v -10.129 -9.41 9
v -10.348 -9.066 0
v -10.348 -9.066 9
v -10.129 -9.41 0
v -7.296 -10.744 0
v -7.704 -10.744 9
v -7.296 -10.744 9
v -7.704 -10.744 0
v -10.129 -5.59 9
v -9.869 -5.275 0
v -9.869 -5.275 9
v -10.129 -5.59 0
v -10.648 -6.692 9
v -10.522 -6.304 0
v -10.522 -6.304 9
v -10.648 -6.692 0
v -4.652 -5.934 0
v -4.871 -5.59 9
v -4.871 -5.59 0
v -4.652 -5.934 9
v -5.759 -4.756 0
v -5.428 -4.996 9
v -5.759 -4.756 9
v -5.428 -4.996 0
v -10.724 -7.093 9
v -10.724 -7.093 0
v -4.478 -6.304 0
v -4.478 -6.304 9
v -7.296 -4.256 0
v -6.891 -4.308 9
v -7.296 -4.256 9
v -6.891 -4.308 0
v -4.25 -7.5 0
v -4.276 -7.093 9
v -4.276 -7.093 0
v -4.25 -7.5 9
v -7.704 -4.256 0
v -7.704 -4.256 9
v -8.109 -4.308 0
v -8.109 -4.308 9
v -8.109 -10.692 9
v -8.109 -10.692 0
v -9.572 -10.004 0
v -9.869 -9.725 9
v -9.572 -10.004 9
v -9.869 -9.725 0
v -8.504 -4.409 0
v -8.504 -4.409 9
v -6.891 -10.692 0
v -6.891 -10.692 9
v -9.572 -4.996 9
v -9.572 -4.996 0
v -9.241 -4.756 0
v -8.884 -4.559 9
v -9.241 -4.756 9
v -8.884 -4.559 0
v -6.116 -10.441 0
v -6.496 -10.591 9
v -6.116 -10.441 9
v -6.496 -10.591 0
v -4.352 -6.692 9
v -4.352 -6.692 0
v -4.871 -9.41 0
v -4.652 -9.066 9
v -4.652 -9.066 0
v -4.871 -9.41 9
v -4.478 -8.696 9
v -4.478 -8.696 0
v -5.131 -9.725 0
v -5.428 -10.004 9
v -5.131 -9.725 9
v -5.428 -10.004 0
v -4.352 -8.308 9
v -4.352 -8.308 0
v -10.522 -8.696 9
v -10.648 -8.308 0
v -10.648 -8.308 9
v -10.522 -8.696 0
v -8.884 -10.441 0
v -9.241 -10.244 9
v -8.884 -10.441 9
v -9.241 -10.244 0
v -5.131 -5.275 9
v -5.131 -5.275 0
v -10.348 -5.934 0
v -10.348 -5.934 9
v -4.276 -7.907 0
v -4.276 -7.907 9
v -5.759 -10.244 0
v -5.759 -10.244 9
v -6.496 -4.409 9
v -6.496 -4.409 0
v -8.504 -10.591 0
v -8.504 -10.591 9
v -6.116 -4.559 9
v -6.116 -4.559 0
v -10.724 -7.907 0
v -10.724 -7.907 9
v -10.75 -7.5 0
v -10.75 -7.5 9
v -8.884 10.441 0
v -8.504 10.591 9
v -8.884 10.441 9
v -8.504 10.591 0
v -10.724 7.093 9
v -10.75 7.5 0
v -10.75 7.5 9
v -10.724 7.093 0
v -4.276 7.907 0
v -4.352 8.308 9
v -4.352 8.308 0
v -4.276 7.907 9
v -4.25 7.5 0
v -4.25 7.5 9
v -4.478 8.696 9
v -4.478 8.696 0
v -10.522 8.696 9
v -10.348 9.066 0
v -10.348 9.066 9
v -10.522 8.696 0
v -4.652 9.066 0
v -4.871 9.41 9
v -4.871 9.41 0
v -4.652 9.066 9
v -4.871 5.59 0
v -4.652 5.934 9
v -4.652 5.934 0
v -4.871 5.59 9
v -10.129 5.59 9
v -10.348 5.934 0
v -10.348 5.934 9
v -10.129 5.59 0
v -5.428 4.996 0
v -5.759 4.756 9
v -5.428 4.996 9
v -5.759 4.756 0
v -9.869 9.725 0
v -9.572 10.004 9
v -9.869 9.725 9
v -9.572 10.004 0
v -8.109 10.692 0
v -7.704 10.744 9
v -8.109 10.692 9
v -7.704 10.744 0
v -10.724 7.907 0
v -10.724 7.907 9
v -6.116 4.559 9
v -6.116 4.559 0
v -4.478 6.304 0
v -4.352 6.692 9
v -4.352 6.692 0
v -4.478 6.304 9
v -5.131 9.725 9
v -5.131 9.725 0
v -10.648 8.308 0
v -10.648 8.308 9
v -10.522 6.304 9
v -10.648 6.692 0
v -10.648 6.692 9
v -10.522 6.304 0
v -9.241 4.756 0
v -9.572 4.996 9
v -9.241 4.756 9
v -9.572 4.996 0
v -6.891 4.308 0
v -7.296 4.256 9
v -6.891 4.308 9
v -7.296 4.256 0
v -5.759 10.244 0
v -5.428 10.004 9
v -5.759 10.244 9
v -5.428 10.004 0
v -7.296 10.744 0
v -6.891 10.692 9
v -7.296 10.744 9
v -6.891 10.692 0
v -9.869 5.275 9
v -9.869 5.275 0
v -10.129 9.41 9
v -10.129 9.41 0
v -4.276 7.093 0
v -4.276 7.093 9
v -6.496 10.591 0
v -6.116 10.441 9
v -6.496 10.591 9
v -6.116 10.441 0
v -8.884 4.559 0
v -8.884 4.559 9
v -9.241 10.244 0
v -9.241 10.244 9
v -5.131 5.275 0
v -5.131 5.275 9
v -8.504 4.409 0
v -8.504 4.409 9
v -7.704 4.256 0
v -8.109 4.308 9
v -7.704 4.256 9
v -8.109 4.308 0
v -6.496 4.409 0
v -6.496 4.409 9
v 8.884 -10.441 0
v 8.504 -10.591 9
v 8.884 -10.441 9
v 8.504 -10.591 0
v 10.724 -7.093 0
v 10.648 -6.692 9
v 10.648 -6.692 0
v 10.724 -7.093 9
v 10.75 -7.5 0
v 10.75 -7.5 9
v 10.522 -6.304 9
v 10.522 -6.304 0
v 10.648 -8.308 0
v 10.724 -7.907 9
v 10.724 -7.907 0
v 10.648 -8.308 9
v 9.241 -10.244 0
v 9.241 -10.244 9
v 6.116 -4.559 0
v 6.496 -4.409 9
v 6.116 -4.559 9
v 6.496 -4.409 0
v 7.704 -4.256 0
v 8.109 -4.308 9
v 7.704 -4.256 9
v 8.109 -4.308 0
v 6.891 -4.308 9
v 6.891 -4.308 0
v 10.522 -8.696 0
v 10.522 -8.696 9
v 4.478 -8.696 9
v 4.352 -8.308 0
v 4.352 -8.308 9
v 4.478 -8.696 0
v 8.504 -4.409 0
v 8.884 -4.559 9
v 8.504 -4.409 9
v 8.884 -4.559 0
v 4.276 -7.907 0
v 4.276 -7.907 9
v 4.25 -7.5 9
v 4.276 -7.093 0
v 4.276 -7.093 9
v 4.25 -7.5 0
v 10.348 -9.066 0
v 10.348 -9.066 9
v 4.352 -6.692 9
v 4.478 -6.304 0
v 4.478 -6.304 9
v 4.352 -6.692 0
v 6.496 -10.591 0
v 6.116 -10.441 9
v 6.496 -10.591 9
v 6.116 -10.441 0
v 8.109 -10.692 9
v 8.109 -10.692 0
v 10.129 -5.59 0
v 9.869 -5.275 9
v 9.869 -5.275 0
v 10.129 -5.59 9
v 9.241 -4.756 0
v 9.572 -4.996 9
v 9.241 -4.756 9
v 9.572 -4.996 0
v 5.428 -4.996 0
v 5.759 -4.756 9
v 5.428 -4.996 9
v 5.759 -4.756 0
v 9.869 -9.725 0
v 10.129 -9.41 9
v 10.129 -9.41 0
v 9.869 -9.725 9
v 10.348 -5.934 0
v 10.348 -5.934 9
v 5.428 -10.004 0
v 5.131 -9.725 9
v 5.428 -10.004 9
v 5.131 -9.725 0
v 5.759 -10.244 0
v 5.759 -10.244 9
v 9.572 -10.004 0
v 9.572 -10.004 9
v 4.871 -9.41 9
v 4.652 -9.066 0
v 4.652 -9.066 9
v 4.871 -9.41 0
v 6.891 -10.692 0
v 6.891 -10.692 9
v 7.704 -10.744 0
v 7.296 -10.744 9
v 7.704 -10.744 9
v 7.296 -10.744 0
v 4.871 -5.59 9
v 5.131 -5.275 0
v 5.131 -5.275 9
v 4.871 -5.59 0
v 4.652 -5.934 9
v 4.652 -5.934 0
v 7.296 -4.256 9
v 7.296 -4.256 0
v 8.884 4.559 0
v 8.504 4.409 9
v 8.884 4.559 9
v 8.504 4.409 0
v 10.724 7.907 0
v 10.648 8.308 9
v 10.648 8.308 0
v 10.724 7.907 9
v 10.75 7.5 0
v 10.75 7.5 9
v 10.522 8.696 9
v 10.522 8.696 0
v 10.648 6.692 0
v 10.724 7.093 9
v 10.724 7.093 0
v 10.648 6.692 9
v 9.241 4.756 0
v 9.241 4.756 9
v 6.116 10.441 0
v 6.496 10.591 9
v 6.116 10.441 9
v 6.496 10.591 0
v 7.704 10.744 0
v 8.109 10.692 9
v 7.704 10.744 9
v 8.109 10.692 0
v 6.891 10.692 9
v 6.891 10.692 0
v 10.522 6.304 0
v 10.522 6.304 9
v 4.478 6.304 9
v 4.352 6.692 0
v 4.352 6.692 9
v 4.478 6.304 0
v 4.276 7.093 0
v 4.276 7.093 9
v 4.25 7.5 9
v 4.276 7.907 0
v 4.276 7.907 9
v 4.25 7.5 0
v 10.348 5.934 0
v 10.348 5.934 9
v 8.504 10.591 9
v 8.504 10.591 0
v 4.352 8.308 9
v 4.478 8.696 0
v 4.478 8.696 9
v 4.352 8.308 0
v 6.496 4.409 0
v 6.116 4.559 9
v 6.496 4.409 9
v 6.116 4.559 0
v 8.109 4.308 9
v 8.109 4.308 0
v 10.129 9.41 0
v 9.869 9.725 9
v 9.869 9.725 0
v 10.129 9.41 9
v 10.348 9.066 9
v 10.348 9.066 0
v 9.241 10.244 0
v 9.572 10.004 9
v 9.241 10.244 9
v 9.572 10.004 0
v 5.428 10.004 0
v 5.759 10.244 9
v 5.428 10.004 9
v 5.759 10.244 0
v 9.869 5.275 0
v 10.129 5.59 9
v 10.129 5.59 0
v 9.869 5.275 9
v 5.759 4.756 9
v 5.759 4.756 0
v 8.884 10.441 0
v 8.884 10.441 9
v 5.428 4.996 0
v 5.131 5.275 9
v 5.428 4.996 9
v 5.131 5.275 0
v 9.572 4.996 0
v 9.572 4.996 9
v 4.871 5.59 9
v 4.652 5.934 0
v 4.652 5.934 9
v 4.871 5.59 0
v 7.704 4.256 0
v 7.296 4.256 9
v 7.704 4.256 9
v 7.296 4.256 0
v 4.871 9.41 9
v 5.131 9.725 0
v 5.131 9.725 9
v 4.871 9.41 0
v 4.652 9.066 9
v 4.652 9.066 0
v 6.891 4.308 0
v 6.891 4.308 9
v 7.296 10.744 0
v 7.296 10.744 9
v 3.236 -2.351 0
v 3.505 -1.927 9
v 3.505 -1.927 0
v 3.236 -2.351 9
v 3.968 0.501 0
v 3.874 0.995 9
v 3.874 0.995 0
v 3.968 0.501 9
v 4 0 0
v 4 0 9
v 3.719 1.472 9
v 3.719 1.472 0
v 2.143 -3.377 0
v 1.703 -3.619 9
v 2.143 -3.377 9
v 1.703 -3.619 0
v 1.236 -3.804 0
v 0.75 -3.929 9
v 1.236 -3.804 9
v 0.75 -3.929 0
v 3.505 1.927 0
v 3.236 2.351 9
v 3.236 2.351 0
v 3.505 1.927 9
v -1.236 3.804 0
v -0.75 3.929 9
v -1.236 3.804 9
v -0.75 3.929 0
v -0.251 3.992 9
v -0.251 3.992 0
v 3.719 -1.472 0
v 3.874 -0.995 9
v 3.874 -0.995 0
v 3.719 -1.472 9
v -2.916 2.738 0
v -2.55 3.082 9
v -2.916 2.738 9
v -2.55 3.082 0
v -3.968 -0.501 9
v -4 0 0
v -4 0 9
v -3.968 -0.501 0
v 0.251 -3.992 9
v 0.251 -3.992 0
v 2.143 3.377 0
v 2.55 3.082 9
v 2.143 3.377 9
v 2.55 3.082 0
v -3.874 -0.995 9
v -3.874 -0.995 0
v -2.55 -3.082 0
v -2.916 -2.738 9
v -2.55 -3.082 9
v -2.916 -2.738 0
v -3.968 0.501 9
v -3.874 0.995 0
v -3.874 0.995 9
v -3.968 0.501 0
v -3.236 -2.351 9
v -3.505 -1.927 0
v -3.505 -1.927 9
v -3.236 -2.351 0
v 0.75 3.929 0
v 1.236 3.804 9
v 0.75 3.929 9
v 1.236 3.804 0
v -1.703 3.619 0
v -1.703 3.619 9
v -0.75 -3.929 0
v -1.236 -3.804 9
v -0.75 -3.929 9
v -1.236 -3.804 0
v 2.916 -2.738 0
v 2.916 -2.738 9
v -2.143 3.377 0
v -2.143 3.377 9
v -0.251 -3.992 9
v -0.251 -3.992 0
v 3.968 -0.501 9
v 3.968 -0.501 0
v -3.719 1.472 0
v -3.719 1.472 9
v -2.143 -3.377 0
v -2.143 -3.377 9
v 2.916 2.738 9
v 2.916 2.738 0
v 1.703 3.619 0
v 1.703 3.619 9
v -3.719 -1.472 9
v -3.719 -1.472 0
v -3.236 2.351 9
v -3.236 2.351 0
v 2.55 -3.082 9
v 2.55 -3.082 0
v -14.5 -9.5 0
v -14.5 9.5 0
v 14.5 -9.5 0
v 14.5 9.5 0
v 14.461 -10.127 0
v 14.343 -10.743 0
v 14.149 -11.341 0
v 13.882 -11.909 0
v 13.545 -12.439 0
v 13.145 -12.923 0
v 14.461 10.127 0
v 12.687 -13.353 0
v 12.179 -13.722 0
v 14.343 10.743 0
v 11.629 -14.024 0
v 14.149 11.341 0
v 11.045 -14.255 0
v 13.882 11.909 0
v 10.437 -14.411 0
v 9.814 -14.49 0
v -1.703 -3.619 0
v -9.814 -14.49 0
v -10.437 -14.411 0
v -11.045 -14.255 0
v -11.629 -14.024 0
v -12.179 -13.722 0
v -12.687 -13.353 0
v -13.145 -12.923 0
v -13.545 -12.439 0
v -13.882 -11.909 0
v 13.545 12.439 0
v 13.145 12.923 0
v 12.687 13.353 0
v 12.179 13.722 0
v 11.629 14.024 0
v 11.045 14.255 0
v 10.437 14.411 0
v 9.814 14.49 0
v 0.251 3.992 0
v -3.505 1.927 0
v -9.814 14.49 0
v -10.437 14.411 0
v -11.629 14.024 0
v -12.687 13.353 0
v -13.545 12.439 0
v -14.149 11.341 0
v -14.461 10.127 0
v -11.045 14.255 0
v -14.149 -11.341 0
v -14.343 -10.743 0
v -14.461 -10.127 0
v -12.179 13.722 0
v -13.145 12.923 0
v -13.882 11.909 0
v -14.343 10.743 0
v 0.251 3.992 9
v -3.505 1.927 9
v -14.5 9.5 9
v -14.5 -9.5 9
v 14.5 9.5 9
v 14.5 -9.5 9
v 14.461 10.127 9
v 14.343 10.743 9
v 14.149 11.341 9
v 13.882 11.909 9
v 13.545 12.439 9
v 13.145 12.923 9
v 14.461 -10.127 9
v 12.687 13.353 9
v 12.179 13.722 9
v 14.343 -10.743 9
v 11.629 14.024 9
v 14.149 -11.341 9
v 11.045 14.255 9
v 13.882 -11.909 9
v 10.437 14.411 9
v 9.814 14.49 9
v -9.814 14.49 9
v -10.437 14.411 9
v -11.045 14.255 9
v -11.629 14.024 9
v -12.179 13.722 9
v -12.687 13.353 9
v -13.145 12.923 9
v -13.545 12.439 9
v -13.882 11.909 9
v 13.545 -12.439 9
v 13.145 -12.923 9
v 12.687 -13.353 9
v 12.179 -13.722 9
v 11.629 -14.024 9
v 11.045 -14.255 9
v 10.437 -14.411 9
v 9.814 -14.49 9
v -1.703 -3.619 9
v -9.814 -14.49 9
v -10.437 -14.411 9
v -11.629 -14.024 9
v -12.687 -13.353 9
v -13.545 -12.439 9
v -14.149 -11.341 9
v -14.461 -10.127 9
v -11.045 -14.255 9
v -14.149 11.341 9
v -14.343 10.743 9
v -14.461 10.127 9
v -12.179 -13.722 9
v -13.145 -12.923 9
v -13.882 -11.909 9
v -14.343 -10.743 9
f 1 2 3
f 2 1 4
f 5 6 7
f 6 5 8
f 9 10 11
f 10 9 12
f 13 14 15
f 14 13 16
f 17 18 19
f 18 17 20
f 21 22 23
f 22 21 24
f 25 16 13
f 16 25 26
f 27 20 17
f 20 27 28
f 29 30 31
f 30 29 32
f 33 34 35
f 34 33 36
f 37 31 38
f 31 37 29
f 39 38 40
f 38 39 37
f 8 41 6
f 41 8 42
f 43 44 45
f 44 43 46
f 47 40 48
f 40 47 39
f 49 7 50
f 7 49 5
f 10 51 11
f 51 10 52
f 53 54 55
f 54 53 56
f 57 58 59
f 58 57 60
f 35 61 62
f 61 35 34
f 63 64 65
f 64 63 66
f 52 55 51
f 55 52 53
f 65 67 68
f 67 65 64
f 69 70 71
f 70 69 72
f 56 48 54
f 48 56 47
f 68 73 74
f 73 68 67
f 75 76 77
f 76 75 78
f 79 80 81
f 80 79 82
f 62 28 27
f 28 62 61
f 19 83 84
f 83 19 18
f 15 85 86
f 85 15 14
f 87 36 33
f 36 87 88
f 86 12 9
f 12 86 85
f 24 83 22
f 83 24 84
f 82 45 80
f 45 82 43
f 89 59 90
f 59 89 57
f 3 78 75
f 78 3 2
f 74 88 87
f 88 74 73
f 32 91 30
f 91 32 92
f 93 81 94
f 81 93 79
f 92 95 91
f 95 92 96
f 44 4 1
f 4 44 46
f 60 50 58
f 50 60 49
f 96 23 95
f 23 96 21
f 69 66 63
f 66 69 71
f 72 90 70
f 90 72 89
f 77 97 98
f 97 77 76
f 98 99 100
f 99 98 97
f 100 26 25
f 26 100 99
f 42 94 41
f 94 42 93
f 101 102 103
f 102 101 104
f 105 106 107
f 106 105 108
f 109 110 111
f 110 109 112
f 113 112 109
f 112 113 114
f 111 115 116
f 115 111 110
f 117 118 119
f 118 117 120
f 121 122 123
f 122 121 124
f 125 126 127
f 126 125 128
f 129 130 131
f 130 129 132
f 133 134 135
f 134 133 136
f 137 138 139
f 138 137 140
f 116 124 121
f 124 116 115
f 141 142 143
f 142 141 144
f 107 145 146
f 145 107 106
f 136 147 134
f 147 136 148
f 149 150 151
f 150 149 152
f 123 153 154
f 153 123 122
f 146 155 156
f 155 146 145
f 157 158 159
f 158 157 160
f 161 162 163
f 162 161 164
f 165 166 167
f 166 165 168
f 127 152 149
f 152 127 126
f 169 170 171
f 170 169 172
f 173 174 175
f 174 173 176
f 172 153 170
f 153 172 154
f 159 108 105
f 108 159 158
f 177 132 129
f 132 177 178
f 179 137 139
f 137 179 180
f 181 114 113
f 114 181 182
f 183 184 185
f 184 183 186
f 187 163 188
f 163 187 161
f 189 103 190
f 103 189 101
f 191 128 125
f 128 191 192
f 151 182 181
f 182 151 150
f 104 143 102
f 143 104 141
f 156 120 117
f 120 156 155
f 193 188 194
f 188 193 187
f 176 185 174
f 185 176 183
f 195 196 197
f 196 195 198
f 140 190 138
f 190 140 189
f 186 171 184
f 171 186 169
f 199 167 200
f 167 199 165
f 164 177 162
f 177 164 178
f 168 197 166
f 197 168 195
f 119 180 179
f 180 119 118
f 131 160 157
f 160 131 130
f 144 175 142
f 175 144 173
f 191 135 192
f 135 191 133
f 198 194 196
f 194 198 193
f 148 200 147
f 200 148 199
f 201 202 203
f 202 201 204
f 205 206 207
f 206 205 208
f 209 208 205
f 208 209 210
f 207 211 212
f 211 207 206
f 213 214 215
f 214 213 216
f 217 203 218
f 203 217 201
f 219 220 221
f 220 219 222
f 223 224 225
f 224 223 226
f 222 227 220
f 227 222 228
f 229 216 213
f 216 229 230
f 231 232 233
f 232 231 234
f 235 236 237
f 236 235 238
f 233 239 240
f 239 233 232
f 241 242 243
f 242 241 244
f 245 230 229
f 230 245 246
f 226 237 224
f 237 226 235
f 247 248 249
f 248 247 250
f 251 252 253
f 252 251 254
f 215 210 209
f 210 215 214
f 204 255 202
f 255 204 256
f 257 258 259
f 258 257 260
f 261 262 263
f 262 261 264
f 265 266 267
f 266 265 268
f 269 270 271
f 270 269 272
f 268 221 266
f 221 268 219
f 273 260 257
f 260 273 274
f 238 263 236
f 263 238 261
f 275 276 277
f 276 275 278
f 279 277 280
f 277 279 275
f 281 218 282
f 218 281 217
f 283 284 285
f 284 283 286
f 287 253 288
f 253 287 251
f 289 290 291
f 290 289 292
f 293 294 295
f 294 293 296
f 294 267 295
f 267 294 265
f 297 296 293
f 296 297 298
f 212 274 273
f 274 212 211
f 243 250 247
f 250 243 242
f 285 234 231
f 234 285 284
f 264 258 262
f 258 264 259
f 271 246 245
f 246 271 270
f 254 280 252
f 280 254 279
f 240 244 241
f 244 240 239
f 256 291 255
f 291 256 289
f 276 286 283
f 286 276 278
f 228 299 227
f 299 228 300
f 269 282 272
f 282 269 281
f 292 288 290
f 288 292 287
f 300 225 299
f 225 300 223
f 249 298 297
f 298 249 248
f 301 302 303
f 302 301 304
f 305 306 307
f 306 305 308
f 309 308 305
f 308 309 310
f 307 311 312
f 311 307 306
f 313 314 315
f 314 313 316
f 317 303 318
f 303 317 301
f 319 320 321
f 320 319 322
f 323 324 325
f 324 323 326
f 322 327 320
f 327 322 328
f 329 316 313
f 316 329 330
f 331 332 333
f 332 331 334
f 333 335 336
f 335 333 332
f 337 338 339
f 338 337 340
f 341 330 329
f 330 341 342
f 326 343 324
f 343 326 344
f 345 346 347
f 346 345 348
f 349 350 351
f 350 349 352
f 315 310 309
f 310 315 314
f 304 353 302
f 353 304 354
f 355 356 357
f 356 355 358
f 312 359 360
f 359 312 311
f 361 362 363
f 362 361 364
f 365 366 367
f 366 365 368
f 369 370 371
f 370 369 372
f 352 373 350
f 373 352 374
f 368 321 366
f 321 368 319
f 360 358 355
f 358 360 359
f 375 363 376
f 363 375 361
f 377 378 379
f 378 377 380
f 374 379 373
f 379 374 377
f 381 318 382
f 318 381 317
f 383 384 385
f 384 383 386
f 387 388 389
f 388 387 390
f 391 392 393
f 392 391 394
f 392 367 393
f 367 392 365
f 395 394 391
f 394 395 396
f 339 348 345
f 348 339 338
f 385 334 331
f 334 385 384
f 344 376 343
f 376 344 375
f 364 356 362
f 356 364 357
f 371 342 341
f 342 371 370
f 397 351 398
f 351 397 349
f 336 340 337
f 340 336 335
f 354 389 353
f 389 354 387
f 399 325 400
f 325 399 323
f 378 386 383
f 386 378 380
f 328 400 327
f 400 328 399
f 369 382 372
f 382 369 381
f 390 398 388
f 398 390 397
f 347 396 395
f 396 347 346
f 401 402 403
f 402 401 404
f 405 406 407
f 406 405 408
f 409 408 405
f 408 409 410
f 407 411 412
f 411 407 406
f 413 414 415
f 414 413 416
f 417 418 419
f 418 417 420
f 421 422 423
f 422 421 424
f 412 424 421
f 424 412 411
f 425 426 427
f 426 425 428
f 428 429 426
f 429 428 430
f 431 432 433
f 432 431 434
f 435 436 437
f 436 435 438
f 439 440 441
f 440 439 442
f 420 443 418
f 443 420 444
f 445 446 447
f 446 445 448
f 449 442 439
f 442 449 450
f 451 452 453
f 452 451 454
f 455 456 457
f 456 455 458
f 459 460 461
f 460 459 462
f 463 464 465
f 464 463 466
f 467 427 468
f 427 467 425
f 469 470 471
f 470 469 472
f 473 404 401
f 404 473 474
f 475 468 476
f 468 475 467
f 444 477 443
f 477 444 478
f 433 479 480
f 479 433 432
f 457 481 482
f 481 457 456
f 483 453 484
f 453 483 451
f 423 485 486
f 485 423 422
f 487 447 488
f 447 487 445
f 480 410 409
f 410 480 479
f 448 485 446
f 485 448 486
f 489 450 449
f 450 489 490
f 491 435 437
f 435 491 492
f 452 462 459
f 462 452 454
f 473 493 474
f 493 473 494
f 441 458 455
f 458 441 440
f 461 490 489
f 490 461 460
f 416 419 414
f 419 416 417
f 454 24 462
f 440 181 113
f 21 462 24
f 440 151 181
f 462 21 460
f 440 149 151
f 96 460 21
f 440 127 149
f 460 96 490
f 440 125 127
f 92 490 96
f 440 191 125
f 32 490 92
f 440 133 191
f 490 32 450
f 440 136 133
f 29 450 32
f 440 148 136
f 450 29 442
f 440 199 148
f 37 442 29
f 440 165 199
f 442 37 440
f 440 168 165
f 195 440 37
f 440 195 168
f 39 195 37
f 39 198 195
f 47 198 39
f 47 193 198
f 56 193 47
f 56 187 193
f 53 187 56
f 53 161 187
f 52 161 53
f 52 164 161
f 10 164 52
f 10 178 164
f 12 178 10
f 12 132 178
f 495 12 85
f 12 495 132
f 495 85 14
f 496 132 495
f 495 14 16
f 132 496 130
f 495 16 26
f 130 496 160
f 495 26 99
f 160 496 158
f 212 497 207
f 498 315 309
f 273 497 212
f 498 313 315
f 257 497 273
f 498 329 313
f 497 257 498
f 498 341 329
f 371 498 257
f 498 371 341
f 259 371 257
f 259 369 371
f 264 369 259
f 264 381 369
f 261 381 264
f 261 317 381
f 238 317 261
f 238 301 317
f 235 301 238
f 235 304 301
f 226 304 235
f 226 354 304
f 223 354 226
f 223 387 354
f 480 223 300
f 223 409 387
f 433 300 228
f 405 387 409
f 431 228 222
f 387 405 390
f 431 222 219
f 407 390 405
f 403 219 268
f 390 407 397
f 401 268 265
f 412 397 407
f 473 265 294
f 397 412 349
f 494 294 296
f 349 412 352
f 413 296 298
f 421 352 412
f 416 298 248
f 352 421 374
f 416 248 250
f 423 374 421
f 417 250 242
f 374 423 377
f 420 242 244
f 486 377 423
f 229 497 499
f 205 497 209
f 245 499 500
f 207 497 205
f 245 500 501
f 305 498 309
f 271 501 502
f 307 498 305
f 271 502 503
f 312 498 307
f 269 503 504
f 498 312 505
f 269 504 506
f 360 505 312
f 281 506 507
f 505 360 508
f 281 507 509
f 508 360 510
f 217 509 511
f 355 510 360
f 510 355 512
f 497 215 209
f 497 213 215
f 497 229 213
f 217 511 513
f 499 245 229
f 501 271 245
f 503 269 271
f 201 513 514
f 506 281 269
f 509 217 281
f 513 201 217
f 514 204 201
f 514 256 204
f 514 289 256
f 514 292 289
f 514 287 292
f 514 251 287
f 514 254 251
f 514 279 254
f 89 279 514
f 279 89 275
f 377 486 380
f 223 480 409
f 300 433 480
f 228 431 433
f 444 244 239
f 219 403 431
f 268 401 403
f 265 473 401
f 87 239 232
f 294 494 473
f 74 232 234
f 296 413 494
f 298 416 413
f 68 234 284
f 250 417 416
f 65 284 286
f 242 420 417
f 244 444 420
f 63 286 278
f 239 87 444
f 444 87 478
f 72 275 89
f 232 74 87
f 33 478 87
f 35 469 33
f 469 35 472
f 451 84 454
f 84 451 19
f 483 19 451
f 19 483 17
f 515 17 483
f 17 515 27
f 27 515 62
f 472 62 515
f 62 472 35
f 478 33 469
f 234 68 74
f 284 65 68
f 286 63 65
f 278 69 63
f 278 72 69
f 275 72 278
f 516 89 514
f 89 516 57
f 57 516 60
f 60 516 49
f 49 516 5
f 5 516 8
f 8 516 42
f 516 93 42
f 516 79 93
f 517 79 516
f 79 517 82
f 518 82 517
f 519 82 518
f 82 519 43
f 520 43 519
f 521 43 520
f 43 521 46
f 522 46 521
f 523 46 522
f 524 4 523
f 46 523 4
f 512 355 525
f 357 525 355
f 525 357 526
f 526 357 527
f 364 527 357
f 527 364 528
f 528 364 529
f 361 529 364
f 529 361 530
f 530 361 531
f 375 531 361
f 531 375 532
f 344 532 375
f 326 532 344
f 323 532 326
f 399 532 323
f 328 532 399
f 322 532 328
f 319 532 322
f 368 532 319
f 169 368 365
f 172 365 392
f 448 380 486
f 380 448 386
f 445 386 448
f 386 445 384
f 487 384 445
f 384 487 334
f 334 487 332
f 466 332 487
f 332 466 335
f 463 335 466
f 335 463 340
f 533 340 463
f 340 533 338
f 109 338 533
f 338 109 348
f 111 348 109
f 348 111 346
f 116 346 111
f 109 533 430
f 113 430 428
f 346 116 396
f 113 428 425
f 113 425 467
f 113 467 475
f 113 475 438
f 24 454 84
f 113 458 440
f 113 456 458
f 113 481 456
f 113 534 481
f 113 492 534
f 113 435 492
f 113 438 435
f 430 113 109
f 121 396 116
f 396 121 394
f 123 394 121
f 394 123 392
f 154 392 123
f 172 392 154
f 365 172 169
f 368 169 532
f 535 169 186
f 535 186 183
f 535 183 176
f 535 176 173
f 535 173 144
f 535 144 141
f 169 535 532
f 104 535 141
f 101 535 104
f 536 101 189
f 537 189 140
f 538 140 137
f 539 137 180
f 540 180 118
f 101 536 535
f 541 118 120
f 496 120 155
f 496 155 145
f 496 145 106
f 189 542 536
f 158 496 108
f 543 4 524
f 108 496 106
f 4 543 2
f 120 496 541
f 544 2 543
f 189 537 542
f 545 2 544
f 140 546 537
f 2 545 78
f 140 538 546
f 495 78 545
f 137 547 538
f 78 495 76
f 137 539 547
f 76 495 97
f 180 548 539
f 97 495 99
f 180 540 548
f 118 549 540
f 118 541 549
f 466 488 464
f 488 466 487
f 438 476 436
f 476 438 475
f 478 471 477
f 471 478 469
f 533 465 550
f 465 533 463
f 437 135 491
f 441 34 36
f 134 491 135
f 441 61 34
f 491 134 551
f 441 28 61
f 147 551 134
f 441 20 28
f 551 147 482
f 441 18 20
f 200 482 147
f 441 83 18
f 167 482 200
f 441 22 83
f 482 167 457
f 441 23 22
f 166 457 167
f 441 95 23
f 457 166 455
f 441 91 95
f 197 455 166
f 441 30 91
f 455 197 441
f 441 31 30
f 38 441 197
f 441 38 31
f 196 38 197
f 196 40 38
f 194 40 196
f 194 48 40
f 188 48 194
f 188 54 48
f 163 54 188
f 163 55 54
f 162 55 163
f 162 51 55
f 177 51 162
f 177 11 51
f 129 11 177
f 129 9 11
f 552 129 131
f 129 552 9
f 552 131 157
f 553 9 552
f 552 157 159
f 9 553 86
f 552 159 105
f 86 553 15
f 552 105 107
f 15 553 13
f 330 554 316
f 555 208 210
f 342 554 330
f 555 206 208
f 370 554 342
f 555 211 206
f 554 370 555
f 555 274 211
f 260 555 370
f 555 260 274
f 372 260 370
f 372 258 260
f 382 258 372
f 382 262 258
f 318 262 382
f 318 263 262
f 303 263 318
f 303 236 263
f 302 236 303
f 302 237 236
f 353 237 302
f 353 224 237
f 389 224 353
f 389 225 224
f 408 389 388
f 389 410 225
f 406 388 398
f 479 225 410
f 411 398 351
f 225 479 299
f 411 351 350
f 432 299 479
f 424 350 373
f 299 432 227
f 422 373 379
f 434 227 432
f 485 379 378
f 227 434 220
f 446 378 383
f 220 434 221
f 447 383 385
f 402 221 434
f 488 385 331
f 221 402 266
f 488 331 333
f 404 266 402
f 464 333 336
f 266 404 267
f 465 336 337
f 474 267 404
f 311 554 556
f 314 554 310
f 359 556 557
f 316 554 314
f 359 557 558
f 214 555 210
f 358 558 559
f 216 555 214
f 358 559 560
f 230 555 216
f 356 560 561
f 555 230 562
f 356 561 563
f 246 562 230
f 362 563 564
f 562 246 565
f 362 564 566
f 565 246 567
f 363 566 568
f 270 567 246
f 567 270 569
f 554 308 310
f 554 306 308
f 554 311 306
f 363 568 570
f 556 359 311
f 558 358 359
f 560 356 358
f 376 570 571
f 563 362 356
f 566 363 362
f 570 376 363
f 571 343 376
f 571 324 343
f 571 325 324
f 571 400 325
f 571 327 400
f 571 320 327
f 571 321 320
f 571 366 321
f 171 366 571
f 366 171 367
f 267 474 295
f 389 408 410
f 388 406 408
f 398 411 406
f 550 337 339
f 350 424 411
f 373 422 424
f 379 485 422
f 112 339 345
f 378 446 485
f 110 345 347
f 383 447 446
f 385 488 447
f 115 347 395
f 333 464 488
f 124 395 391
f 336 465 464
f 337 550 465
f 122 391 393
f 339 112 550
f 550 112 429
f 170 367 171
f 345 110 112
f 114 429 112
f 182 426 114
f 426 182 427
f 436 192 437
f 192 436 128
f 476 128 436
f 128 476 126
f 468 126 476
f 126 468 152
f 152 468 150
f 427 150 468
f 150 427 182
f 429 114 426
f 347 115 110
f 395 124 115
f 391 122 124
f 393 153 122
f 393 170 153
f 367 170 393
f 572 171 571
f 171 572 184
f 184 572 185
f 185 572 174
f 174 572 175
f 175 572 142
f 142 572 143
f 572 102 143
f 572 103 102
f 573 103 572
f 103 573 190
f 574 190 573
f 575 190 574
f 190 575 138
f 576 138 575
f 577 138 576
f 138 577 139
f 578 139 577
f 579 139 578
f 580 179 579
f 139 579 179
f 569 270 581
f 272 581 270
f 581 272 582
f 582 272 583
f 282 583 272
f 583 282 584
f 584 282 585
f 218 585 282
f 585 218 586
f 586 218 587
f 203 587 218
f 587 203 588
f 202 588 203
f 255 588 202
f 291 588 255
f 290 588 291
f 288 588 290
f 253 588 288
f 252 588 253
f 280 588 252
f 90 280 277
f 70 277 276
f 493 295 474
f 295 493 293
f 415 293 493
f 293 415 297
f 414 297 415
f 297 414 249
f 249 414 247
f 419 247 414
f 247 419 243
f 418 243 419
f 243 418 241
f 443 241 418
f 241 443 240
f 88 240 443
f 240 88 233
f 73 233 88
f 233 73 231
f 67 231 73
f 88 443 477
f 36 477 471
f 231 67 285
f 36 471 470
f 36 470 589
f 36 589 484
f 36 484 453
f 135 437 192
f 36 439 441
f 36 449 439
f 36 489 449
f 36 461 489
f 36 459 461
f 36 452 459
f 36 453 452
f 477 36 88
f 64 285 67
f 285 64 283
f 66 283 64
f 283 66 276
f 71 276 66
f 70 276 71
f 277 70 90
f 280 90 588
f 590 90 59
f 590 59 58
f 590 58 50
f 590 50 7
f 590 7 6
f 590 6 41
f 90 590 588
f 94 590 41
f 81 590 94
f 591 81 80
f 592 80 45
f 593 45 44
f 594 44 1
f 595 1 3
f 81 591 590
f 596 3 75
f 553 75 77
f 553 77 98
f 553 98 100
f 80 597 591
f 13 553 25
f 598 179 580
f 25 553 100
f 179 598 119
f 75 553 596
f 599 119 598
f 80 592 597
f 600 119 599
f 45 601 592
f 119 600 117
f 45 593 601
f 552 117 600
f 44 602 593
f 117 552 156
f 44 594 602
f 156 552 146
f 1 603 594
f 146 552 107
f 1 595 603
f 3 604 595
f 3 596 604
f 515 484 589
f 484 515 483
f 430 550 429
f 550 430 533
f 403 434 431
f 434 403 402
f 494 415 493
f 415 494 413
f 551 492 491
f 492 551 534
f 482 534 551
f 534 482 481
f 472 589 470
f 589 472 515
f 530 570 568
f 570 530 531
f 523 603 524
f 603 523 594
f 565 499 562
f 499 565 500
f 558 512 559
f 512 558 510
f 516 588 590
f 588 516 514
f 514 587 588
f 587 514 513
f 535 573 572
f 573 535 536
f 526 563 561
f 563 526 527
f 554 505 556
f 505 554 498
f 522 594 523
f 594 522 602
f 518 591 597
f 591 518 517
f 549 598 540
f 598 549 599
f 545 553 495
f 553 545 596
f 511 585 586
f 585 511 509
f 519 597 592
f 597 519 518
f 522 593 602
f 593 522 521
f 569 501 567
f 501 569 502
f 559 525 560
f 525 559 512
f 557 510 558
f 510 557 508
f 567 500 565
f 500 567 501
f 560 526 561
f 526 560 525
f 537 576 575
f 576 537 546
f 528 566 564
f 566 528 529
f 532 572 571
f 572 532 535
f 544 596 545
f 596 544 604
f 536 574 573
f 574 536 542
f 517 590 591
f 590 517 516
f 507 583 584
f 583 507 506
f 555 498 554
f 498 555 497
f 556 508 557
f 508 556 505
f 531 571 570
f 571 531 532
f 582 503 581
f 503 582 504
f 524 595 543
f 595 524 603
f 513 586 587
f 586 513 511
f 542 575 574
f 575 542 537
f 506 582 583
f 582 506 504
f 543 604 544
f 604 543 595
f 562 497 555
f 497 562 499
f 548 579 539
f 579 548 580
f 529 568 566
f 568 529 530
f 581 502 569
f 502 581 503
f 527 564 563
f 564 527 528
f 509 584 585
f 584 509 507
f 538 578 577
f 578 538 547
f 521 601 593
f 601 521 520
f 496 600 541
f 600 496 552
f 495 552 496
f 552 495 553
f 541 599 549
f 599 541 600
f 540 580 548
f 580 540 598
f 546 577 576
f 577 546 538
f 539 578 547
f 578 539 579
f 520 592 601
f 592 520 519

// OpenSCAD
$fn = 50;


difference() {
	union() {
		hull() {
			translate(v = [-9.5000000000, 9.5000000000, 0]) {
				cylinder(h = 9, r = 5);
			}
			translate(v = [9.5000000000, 9.5000000000, 0]) {
				cylinder(h = 9, r = 5);
			}
			translate(v = [-9.5000000000, -9.5000000000, 0]) {
				cylinder(h = 9, r = 5);
			}
			translate(v = [9.5000000000, -9.5000000000, 0]) {
				cylinder(h = 9, r = 5);
			}
		}
	}
	union() {
		#translate(v = [-7.5000000000, -7.5000000000, -100.0000000000]) {
			cylinder(h = 200, r = 3.2500000000);
		}
		#translate(v = [-7.5000000000, 7.5000000000, -100.0000000000]) {
			cylinder(h = 200, r = 3.2500000000);
		}
		#translate(v = [7.5000000000, -7.5000000000, -100.0000000000]) {
			cylinder(h = 200, r = 3.2500000000);
		}
		#translate(v = [7.5000000000, 7.5000000000, -100.0000000000]) {
			cylinder(h = 200, r = 3.2500000000);
		}
		#cylinder(h = 9, r = 4.0000000000);
	}
}
